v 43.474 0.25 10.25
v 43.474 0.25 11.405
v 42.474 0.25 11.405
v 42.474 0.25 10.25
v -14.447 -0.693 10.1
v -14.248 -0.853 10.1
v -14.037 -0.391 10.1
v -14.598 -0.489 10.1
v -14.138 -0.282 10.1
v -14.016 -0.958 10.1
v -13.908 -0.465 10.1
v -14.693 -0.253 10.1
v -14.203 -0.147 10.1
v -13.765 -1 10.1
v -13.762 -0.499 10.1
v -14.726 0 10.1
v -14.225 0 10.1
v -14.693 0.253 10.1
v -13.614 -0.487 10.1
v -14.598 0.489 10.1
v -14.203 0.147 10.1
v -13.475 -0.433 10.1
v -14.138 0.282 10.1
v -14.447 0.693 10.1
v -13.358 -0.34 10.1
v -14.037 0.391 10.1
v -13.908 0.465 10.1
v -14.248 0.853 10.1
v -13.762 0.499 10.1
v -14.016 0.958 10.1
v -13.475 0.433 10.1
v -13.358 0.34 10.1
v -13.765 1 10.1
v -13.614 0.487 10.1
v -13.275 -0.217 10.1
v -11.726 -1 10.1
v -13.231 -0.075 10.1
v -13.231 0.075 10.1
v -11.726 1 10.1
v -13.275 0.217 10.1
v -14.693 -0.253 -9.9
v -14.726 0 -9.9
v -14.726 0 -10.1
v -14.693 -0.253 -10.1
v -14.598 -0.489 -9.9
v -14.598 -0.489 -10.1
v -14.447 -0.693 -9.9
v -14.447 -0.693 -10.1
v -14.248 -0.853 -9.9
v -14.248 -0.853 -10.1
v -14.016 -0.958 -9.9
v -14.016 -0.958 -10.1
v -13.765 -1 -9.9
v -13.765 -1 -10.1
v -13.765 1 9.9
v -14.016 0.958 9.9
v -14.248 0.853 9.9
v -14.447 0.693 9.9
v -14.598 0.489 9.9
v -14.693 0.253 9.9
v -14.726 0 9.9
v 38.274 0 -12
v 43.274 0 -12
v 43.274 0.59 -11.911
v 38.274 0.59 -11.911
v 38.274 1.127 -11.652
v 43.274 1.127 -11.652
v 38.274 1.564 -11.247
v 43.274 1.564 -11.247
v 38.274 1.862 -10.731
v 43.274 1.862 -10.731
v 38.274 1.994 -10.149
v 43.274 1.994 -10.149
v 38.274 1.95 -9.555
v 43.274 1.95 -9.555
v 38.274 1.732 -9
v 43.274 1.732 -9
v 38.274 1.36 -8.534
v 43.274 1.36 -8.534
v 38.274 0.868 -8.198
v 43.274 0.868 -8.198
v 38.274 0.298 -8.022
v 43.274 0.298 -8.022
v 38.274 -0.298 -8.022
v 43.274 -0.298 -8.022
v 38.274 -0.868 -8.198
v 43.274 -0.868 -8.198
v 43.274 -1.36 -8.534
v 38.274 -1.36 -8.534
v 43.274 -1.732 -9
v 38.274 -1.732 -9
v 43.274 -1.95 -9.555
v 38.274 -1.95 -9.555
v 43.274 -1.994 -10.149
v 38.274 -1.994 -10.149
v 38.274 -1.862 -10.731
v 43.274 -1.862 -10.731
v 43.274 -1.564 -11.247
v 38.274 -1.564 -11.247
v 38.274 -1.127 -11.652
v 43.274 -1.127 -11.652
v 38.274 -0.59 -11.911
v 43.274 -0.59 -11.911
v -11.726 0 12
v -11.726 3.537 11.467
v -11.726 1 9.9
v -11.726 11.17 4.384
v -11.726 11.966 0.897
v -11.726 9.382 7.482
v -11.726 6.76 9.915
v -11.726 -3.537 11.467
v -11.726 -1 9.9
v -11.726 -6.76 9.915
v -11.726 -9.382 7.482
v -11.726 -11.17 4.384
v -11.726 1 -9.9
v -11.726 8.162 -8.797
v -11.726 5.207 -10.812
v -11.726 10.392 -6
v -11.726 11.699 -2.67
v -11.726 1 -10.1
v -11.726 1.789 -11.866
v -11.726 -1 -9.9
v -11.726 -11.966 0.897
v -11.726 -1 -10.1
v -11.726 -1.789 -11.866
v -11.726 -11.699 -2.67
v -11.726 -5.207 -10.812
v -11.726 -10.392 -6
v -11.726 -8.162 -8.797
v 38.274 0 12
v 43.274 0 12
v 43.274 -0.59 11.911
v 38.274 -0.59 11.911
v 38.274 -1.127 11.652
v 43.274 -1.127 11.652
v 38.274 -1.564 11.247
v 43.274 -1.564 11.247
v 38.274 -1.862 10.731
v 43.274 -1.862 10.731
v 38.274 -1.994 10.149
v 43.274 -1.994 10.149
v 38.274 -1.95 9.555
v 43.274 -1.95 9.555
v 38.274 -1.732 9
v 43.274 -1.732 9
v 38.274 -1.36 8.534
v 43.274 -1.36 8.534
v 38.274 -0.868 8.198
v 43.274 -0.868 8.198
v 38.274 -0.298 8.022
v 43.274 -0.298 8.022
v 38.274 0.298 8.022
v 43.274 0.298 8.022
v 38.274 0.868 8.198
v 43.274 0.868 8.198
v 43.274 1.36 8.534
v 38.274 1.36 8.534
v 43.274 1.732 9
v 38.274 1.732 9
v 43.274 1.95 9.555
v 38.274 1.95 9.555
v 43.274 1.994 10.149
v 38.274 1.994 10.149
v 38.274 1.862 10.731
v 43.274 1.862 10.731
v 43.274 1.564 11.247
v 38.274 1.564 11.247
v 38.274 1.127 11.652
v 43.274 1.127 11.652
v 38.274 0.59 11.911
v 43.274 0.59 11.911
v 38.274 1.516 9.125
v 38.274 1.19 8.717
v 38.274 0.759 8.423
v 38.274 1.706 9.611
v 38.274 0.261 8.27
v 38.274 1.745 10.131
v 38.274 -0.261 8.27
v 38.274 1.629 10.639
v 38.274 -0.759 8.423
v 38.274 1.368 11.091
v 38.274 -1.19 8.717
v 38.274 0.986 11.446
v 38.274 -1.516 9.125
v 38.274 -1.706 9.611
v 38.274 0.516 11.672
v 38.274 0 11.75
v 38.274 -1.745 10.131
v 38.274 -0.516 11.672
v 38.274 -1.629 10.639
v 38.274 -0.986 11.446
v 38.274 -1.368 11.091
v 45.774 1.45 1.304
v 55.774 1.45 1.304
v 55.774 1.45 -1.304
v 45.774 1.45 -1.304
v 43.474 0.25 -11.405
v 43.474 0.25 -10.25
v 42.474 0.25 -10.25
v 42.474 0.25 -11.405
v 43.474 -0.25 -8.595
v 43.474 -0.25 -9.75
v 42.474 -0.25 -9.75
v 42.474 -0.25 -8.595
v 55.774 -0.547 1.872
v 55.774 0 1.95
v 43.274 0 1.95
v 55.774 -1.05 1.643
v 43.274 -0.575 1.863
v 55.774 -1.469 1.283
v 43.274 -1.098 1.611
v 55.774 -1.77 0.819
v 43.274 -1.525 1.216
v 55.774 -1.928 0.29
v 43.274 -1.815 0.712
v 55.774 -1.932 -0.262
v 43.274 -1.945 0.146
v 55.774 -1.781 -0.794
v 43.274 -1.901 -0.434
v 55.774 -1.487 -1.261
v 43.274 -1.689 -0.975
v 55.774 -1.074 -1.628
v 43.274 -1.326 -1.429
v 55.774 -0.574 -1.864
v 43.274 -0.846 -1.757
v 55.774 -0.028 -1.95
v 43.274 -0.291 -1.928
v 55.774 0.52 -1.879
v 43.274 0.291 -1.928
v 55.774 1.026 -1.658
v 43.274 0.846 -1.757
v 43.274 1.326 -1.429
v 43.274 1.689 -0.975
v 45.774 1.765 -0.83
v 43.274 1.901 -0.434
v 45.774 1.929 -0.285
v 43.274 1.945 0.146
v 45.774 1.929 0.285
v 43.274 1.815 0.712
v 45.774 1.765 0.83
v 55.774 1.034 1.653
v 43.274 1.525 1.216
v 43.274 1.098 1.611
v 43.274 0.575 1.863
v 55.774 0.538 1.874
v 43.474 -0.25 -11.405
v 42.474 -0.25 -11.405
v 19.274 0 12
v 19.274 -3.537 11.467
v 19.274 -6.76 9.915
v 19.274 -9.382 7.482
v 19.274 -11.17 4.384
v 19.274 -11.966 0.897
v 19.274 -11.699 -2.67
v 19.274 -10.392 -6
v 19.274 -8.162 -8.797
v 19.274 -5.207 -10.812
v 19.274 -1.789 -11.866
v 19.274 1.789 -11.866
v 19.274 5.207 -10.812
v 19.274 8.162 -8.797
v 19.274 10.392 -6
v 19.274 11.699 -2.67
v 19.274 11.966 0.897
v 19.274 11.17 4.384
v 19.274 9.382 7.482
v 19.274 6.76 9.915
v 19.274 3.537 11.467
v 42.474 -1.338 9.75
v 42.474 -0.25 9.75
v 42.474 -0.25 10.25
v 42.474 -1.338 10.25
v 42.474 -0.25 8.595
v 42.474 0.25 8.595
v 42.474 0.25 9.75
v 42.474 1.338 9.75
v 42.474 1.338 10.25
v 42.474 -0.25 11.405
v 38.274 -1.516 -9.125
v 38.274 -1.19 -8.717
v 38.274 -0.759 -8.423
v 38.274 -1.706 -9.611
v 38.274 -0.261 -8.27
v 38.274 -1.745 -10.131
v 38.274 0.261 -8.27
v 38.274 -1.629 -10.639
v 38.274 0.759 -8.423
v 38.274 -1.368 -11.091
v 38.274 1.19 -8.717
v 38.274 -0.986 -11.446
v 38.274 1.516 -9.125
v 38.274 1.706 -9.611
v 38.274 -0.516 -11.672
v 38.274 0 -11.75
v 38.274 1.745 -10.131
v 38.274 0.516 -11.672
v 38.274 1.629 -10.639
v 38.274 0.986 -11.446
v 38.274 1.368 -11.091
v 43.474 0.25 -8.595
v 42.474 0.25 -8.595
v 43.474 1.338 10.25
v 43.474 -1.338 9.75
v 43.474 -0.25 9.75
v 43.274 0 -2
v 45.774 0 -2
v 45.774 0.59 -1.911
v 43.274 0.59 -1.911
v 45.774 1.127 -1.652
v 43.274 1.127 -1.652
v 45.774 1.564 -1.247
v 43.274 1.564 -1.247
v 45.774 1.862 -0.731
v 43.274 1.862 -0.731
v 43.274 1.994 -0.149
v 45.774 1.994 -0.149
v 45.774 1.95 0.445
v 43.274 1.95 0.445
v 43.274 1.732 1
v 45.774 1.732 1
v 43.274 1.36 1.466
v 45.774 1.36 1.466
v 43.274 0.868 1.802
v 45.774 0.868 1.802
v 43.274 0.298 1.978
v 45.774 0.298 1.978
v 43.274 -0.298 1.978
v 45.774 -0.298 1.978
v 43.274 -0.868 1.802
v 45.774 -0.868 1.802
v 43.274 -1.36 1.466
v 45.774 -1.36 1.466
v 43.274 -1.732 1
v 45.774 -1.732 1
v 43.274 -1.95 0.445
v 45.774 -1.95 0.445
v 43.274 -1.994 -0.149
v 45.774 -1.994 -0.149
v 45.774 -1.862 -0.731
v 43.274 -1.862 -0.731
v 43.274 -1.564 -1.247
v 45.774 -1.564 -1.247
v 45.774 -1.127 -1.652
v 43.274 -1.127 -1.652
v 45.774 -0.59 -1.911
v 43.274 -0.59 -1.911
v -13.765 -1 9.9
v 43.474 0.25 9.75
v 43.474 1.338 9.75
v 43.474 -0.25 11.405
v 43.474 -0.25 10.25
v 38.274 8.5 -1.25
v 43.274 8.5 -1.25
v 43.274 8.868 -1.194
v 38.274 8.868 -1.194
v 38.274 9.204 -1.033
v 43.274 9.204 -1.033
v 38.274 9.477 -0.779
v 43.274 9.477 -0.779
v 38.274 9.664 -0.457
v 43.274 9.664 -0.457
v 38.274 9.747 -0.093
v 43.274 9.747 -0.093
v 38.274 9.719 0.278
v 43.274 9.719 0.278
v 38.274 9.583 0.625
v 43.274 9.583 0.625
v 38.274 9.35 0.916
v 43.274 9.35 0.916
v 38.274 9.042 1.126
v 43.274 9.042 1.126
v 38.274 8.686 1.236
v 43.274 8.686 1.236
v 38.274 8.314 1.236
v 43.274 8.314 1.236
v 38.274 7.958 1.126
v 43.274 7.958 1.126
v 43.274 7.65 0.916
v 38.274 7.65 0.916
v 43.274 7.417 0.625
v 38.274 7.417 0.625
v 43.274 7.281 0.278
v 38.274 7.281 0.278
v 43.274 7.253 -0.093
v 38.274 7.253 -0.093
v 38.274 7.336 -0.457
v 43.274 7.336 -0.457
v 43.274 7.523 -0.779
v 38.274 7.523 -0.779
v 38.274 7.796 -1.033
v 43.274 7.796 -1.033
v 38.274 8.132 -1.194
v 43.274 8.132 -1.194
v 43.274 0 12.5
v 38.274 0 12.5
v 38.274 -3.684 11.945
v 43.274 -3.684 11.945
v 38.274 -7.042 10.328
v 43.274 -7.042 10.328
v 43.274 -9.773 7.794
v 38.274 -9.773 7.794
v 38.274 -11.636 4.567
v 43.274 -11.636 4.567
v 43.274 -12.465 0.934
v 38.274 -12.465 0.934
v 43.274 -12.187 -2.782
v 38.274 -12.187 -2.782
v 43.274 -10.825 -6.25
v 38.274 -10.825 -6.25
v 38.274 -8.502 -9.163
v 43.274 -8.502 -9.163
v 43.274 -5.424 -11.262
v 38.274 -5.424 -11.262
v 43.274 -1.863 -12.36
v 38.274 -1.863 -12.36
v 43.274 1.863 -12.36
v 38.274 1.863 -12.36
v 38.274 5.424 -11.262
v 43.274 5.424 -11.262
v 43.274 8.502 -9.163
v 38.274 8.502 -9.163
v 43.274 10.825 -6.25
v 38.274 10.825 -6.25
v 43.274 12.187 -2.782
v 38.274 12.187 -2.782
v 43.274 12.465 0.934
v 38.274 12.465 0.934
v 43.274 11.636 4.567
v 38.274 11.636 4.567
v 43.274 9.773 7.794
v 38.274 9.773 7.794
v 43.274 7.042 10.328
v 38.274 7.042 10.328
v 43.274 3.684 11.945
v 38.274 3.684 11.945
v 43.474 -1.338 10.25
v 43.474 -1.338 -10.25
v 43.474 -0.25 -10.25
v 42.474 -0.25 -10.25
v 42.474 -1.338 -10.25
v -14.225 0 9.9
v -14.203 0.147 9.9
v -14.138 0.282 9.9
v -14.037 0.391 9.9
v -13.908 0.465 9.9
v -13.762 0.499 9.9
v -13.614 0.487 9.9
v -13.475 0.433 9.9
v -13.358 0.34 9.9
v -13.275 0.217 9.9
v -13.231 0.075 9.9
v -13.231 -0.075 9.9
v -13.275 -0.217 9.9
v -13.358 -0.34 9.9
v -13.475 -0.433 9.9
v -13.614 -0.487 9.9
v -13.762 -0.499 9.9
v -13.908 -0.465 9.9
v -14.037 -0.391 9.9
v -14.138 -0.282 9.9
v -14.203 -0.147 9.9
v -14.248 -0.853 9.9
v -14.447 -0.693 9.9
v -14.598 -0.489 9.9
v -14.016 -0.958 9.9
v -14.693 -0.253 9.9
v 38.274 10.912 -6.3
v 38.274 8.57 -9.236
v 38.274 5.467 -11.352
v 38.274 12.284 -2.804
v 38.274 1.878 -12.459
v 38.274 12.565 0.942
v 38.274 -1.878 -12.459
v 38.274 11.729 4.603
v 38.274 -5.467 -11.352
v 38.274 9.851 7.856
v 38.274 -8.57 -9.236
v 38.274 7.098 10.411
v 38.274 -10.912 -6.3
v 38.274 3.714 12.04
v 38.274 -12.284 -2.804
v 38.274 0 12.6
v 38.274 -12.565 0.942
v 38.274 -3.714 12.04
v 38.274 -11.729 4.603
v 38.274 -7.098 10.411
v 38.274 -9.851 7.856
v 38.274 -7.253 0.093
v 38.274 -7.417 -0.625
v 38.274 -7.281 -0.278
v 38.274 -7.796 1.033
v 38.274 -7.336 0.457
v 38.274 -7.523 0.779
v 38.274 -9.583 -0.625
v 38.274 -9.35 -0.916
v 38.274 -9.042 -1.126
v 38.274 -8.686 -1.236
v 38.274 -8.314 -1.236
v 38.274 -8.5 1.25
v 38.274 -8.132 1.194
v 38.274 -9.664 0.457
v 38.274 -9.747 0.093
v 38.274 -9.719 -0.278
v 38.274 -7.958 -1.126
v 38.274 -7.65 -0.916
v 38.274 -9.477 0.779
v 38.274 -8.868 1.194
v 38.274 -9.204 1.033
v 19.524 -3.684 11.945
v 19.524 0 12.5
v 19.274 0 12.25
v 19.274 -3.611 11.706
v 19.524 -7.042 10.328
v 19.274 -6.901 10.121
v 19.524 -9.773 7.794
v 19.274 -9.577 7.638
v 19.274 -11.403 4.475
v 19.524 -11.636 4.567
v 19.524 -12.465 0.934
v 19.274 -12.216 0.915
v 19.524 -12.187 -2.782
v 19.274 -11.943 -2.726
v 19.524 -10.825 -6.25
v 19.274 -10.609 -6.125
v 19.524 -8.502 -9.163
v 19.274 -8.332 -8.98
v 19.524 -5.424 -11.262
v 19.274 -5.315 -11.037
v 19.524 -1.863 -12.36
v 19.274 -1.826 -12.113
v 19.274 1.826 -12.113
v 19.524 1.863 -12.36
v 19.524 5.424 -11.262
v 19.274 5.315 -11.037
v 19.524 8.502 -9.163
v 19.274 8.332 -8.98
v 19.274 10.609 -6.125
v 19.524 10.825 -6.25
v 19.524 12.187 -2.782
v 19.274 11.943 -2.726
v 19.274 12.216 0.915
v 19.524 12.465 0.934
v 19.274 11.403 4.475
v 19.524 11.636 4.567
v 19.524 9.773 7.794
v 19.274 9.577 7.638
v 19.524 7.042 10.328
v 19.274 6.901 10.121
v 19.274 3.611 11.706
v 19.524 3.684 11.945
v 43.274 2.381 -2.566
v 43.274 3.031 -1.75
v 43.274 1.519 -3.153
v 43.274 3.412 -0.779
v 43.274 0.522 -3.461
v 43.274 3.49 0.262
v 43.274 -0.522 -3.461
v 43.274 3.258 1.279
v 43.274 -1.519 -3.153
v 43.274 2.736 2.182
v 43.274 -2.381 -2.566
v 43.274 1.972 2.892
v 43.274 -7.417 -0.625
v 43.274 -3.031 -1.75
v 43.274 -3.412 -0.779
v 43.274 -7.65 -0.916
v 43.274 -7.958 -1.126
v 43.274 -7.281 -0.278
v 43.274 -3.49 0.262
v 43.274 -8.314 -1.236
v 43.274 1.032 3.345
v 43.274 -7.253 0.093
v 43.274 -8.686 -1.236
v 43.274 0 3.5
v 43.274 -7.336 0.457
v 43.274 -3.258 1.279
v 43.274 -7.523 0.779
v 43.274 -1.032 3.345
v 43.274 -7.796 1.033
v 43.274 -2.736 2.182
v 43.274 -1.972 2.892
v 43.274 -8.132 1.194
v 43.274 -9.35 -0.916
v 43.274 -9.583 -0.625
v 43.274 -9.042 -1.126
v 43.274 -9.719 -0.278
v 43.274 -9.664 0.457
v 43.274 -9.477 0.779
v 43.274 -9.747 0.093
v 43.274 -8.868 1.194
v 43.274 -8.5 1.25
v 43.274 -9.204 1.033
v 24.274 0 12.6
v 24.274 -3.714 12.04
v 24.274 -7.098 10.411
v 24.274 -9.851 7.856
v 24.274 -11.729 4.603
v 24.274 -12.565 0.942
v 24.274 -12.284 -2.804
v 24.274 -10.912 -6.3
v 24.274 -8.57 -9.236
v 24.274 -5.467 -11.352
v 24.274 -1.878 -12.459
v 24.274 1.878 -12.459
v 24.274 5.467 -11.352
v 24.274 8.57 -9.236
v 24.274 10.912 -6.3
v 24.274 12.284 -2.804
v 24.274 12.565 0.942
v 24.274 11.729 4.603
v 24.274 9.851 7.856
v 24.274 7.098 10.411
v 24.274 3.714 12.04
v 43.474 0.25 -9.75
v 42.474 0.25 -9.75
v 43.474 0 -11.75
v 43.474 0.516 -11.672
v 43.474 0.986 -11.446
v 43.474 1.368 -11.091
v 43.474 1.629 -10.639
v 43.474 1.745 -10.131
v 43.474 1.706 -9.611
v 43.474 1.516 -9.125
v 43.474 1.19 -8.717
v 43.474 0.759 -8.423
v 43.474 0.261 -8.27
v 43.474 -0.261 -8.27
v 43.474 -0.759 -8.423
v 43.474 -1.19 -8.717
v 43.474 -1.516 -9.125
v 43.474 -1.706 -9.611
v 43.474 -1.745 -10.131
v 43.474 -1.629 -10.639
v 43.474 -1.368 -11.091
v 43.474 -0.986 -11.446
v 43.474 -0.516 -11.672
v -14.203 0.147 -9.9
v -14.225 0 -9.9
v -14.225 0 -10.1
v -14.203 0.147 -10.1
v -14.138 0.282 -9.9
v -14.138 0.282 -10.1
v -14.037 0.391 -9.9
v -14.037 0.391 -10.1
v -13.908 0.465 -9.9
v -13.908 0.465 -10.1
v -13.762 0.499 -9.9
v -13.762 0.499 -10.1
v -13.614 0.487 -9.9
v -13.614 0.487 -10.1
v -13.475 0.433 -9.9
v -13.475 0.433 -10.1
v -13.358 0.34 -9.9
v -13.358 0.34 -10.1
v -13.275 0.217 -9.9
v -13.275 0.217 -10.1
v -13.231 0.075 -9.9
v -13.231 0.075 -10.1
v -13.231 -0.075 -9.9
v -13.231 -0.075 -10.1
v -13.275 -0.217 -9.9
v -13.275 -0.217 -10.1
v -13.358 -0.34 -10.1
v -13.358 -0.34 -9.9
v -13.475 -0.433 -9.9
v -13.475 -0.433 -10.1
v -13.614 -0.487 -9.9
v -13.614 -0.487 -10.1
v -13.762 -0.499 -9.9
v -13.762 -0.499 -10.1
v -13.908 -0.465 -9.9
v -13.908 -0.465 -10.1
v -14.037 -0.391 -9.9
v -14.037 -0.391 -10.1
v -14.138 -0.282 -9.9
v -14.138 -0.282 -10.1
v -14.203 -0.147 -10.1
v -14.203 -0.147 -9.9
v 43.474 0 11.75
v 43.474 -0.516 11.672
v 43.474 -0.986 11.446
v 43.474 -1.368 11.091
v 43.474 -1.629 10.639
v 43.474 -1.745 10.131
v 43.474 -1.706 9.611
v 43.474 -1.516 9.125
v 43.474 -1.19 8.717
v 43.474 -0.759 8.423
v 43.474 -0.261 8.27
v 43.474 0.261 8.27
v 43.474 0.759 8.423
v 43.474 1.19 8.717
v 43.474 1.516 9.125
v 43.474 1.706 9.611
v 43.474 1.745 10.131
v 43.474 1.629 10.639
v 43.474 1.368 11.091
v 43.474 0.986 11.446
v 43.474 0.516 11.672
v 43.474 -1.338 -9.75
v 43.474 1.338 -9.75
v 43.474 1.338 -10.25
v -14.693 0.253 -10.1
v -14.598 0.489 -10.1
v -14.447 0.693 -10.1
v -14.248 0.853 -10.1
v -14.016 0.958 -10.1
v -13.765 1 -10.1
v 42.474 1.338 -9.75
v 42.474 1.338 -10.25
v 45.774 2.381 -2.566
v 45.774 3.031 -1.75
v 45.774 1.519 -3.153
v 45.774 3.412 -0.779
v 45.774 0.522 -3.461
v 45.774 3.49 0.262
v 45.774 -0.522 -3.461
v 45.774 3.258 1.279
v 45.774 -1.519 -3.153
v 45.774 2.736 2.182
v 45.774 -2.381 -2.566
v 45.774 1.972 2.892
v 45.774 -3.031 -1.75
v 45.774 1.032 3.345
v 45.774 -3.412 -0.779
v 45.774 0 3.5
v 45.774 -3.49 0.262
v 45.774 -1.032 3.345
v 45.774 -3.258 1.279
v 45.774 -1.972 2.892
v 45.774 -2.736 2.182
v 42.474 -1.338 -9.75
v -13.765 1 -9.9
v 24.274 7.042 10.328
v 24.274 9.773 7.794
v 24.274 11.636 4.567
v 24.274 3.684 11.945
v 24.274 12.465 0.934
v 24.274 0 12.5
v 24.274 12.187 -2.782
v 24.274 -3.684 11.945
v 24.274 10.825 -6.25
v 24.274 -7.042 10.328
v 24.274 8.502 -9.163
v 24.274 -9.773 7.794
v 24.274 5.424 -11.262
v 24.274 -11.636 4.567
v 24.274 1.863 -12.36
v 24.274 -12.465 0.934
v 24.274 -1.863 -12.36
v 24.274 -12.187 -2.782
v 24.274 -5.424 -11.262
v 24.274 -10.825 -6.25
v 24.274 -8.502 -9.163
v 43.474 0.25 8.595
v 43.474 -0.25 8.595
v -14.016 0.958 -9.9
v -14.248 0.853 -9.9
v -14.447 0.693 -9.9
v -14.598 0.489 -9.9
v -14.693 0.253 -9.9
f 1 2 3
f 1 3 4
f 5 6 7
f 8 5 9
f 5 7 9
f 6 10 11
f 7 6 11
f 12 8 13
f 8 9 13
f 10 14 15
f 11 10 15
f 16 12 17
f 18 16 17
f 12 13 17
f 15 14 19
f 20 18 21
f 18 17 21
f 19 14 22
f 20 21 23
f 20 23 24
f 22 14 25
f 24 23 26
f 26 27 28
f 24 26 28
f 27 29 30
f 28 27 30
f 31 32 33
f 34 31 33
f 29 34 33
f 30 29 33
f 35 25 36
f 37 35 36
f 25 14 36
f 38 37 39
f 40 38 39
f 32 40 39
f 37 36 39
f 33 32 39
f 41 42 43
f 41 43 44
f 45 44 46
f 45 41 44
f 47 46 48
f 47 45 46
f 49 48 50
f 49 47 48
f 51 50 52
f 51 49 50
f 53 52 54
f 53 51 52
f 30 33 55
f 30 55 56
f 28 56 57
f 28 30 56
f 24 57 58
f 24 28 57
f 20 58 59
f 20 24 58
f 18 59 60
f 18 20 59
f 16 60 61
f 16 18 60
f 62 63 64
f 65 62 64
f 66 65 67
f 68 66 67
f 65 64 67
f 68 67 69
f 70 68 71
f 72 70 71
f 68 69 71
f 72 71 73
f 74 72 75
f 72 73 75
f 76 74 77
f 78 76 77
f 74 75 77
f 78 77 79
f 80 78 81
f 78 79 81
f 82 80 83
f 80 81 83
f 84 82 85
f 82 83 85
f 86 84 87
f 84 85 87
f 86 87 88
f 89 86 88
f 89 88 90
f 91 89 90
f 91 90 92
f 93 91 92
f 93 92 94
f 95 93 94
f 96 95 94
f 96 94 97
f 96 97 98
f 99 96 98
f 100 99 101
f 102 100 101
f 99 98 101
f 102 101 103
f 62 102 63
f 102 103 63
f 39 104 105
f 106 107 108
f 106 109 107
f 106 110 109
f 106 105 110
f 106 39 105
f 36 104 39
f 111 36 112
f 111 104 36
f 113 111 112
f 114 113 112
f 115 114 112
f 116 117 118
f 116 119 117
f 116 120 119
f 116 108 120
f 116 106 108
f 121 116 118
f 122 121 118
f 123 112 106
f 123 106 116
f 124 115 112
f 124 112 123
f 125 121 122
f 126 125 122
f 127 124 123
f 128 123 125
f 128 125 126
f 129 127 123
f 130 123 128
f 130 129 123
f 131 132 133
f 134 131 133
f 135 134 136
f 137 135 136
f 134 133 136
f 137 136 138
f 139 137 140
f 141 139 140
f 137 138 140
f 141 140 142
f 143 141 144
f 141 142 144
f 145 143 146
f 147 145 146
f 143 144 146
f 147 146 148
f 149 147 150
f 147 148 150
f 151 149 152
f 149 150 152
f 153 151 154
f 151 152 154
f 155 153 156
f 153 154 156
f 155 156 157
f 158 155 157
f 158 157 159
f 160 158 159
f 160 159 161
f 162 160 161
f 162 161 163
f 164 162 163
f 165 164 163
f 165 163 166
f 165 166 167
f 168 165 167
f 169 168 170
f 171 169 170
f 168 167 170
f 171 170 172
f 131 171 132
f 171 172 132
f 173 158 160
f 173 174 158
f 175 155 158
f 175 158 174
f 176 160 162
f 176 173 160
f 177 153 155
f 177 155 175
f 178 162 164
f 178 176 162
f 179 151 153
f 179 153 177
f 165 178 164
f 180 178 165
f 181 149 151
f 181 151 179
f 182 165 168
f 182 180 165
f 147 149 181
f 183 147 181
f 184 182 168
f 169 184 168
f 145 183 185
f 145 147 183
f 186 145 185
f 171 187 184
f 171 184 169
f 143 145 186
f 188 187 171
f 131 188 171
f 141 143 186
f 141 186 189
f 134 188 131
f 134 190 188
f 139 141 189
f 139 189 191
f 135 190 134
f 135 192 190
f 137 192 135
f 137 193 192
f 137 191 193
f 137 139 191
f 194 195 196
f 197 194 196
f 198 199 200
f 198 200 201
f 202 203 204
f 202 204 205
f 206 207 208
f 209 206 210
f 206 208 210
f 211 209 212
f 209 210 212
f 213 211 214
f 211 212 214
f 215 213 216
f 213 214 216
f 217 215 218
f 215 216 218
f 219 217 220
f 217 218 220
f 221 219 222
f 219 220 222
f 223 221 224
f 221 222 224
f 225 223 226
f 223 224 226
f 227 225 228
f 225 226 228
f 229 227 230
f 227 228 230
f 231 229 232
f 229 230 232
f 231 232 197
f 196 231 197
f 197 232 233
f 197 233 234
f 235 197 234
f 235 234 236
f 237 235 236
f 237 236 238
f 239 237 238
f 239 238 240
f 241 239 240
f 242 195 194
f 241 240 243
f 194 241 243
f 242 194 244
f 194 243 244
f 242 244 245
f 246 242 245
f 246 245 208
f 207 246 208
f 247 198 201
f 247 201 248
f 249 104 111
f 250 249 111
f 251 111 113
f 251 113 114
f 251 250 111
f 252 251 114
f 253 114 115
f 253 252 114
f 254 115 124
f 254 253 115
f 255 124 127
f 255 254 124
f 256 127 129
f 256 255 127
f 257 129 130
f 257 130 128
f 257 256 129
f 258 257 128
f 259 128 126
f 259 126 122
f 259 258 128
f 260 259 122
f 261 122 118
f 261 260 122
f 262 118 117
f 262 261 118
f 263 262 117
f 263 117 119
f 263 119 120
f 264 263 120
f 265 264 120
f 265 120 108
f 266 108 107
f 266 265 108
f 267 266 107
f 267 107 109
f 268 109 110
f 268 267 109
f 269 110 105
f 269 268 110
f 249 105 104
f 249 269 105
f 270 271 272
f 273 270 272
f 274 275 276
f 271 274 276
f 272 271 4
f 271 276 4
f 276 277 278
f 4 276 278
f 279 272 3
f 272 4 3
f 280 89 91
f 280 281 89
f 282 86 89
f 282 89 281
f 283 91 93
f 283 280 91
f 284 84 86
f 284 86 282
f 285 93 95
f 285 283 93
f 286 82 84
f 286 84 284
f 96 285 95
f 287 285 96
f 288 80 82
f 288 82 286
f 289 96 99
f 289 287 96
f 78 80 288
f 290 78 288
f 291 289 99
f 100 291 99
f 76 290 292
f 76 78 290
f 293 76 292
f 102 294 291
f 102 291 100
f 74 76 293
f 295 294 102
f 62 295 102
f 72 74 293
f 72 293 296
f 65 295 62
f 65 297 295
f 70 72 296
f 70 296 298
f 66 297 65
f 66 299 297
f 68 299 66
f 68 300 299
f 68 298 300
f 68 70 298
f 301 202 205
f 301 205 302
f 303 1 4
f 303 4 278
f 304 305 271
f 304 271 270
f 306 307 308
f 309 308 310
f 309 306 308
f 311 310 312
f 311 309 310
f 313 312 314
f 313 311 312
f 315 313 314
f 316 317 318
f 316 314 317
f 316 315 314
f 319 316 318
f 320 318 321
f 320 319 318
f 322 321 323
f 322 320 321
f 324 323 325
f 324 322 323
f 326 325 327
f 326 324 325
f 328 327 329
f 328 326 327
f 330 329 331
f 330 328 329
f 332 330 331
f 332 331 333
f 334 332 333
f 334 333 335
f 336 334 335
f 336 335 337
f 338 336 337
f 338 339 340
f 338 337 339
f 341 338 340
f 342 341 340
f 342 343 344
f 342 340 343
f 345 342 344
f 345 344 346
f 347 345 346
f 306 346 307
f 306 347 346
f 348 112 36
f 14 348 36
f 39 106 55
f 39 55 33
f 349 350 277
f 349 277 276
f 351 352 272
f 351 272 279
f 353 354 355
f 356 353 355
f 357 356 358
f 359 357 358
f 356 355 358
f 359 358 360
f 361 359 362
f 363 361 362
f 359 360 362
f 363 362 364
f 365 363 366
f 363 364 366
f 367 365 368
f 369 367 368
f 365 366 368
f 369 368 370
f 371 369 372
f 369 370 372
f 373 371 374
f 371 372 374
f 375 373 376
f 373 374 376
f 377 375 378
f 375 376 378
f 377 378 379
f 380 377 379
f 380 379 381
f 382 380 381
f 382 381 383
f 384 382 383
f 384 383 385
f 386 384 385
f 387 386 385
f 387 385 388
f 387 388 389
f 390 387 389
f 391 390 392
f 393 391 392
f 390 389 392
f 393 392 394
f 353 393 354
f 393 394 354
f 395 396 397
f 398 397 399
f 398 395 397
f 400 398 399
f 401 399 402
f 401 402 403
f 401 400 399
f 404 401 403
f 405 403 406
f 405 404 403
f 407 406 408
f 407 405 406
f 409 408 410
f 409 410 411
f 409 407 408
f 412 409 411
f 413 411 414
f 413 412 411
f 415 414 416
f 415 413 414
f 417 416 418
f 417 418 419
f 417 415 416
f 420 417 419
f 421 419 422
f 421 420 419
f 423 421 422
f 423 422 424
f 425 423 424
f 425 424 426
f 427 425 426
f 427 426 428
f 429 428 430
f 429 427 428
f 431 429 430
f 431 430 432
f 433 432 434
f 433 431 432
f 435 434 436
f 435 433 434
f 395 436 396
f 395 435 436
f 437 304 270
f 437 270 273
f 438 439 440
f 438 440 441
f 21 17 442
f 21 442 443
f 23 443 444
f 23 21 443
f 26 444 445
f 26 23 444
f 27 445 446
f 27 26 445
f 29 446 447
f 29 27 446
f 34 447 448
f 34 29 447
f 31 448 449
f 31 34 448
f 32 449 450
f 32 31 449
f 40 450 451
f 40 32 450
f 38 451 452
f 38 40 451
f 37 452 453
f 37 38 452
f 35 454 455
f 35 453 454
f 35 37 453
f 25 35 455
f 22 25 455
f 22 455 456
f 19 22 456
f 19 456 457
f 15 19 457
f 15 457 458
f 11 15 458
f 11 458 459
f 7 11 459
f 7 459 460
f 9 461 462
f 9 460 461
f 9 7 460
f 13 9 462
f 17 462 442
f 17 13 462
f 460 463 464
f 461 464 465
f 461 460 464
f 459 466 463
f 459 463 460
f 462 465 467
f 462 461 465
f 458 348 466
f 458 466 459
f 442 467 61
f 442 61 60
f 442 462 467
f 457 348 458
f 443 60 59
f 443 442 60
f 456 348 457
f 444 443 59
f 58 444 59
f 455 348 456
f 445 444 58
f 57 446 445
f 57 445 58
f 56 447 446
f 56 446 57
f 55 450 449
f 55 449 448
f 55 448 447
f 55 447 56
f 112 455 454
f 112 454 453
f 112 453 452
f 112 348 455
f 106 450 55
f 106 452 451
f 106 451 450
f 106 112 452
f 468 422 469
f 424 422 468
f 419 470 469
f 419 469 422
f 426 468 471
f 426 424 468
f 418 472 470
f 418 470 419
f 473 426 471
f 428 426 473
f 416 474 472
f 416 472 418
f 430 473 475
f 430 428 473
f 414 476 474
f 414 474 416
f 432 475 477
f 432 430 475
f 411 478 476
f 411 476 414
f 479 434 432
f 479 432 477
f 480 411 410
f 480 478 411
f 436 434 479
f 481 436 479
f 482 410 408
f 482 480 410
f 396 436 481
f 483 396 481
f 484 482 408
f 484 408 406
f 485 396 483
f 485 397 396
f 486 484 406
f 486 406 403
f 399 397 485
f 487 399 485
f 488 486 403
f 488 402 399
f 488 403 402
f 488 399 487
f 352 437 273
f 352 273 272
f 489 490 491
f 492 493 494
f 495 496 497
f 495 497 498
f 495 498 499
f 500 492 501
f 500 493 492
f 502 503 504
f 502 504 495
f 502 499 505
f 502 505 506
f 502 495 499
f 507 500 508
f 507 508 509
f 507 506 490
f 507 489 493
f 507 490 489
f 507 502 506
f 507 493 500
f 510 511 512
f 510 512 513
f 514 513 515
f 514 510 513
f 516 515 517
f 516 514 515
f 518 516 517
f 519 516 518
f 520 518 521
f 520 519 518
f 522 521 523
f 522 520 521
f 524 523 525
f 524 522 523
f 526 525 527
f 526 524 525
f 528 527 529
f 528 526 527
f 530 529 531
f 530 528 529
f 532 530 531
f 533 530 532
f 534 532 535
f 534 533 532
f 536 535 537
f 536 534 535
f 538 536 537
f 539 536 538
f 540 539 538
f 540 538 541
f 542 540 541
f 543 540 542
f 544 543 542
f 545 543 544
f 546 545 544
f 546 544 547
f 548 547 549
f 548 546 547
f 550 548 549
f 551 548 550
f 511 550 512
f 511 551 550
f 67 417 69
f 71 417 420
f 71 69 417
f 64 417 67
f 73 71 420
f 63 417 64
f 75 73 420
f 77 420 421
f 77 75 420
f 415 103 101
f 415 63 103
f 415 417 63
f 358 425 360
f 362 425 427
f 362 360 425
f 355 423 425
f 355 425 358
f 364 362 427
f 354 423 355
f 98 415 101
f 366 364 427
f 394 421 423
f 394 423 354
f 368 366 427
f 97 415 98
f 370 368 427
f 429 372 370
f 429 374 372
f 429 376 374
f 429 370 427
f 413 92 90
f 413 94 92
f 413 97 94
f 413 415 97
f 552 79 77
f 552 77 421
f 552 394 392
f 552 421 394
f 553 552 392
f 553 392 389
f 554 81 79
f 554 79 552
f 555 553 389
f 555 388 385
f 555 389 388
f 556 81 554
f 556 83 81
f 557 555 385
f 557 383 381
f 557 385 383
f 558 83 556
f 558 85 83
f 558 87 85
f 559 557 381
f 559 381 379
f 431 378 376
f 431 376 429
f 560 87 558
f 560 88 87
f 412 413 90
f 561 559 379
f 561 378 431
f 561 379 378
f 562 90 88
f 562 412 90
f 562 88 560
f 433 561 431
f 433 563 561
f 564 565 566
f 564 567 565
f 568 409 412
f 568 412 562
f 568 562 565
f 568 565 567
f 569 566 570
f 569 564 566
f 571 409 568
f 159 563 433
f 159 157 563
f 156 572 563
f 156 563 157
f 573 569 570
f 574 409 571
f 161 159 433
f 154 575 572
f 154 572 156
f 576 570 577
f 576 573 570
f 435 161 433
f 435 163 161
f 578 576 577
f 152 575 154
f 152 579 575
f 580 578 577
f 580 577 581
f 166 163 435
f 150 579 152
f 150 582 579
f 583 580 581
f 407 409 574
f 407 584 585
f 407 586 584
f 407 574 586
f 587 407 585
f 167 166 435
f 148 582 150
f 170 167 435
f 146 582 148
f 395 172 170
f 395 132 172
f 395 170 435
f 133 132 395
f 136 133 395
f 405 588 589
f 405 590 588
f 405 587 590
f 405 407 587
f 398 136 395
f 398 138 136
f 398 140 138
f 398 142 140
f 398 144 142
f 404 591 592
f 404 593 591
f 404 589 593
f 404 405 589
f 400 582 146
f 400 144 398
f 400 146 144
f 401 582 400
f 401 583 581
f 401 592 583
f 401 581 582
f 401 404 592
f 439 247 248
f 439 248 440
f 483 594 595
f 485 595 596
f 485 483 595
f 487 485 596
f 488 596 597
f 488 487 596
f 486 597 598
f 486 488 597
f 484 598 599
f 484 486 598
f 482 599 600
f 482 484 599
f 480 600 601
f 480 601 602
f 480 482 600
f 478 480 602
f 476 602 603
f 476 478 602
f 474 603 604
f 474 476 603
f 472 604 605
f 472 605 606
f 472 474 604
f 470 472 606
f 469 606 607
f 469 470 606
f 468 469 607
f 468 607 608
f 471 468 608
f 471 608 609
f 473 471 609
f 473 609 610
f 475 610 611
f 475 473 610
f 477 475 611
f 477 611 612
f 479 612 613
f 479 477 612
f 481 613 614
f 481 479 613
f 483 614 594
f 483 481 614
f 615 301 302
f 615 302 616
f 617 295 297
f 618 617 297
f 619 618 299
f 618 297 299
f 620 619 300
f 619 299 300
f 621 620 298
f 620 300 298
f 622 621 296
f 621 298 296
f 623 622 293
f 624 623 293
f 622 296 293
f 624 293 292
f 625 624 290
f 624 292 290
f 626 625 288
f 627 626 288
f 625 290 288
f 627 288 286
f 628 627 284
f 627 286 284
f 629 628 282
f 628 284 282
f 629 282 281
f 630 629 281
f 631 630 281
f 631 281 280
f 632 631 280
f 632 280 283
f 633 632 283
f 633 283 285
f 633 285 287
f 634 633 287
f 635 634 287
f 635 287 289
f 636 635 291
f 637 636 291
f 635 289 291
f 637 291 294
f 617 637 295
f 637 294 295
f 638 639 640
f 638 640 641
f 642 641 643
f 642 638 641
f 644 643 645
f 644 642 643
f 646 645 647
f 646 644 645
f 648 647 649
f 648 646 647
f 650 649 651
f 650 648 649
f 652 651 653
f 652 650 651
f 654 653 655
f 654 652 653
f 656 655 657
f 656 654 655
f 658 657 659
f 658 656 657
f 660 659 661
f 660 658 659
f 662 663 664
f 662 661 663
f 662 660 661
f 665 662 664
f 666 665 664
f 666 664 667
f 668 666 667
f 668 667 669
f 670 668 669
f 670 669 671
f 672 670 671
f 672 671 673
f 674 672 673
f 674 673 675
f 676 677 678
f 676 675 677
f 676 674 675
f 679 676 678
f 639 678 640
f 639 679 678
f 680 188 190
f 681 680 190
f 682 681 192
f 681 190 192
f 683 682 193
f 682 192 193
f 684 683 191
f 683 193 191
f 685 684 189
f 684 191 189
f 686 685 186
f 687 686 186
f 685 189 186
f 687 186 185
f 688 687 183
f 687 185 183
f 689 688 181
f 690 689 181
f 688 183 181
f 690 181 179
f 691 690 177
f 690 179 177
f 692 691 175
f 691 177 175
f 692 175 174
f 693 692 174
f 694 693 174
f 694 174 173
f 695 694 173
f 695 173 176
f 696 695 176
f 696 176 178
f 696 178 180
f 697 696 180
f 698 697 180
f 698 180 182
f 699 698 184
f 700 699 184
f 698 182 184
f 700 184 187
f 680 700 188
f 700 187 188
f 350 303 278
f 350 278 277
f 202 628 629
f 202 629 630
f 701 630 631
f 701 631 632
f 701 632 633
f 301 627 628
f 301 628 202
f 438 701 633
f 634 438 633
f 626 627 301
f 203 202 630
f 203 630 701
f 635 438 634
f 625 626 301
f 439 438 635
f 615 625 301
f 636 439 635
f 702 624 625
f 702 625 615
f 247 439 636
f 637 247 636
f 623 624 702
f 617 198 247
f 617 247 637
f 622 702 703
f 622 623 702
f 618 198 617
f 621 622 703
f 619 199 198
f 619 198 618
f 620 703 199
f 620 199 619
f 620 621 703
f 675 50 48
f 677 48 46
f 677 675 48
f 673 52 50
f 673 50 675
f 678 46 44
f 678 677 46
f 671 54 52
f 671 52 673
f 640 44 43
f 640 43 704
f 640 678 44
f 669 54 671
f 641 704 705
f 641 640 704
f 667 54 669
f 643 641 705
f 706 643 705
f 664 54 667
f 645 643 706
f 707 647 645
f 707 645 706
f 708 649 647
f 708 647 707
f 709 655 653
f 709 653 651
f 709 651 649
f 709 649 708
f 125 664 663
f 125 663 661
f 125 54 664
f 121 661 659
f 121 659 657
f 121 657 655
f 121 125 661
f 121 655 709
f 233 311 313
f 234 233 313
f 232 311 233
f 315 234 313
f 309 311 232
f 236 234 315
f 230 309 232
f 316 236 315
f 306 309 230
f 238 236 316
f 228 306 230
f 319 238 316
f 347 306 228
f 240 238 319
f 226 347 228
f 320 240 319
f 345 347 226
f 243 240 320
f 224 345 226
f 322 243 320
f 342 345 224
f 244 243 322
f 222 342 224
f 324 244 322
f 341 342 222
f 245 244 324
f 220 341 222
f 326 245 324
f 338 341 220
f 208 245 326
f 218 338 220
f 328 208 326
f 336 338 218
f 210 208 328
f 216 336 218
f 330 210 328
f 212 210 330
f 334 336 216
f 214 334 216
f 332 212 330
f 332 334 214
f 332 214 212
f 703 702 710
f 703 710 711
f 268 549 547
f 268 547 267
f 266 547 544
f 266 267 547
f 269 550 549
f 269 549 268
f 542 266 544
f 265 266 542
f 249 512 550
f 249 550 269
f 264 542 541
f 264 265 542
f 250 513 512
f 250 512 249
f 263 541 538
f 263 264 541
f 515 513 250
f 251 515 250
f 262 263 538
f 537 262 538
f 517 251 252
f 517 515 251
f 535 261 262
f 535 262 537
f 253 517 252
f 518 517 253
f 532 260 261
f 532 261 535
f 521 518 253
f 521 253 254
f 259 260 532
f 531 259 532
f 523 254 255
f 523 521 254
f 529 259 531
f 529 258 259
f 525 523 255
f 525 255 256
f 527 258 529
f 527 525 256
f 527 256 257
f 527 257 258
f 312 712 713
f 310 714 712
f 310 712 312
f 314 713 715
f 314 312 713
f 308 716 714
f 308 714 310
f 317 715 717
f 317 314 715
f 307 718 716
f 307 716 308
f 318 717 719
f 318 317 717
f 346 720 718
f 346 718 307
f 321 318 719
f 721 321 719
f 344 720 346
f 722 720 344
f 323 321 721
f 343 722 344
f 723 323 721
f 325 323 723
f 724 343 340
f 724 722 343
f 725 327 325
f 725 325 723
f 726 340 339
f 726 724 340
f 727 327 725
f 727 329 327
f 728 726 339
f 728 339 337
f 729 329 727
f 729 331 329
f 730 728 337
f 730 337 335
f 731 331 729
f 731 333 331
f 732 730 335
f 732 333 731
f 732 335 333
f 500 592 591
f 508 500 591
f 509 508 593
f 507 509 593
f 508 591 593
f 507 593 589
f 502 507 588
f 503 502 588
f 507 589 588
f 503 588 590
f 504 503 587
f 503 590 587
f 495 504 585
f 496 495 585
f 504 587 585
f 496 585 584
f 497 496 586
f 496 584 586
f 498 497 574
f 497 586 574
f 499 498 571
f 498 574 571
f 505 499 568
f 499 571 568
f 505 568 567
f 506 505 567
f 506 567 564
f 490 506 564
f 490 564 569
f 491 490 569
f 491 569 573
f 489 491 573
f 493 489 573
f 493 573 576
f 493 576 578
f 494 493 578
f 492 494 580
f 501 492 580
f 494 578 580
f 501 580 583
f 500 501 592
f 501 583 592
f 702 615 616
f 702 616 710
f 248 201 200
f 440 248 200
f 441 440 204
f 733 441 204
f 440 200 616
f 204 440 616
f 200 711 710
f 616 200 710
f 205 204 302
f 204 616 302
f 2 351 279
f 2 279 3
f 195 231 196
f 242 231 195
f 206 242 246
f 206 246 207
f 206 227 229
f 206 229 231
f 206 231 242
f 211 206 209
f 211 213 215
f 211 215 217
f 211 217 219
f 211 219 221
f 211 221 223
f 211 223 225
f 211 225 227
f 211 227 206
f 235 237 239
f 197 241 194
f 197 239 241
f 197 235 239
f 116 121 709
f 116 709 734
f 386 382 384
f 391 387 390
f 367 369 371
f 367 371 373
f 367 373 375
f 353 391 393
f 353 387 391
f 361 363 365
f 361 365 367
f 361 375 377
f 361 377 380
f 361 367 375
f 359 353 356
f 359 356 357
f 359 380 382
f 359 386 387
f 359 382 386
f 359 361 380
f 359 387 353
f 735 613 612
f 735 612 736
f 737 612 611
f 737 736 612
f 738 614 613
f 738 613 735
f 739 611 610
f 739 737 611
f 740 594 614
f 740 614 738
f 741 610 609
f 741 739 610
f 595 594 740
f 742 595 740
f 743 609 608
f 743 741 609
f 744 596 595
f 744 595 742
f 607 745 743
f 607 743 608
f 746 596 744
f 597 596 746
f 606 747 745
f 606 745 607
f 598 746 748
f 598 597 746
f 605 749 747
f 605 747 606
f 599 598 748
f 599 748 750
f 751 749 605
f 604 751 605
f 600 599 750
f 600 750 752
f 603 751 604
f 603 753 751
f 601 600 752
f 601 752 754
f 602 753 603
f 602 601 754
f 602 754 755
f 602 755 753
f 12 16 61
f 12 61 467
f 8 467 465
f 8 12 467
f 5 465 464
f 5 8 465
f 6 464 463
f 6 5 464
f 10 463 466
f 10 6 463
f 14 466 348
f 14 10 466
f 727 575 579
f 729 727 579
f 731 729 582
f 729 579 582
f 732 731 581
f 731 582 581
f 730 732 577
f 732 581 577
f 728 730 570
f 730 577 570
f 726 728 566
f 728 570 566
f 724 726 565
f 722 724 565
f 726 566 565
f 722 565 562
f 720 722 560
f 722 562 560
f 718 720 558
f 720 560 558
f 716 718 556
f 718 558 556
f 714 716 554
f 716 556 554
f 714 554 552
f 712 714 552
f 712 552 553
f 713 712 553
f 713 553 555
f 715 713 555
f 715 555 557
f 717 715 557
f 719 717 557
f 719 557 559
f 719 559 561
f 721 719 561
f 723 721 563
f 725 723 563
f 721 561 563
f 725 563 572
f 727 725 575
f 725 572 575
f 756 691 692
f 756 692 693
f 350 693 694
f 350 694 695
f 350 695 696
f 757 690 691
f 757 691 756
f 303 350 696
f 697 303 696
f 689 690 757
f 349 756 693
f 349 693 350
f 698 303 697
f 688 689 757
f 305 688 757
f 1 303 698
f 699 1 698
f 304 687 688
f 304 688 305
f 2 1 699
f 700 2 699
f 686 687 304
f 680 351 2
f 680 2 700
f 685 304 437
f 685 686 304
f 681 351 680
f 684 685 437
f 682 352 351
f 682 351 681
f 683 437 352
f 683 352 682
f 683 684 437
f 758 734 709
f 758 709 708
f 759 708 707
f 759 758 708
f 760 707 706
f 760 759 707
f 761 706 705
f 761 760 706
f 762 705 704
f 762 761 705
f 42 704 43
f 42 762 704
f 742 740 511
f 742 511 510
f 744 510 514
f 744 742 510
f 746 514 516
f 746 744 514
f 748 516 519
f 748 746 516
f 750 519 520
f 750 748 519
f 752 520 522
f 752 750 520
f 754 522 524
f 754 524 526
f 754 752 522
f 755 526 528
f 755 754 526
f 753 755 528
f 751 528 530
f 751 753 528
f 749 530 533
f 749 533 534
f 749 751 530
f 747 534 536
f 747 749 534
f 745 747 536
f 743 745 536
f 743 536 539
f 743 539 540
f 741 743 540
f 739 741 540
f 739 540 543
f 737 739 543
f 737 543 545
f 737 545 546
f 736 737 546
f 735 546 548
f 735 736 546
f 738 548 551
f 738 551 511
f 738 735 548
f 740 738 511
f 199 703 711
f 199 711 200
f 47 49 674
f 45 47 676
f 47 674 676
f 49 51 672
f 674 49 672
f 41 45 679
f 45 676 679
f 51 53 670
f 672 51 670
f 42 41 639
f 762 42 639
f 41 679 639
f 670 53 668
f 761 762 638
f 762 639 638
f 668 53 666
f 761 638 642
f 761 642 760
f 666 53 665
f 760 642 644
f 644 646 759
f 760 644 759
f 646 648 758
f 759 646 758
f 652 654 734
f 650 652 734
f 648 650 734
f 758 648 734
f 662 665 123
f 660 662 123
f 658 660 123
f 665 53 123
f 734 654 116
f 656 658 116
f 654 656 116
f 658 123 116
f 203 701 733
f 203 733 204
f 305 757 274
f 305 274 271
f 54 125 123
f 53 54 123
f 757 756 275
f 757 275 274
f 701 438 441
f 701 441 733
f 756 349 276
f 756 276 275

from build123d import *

# Parameters (mm, degrees)
SKETCH3_R               = 3.5
SKETCH3_R_2             = 2
BOSS_EXTRUDE1_DEPTH     = 2.5
SKETCH4_R               = 1.95
BOSS_EXTRUDE2_DEPTH     = 12.5
CUT_EXTRUDE1_DEPTH      = 10
CHAMFER1_SIZE           = 0.25
SKETCH6_R               = 2
CUT_EXTRUDE2_DEPTH      = 5
SKETCH7_R               = 1.75
BOSS_EXTRUDE3_DEPTH     = 5.2
CUT_EXTRUDE4_DEPTH      = 1
SKETCH9_R               = 1.25
CUT_EXTRUDE5_DEPTH      = 5
SKETCH11_W              = 0.2
SKETCH11_H              = 2
BOSS_EXTRUDE4_DEPTH     = 3
CUT_EXTRUDE6_START      = -20.2
CUT_EXTRUDE6_DEPTH      = 20.2
CUT_EXTRUDE7_DEPTH      = 62.520823074
CUT_EXTRUDE7_DEPTH_BACK = 62.520823074
SKETCH13_R              = 0.5


# Read off the part's stored shape, not the designer's step: Cut-Extrude6
with BuildPart() as part:
    # Sketch1 → Revolve1 (revolve)
    with BuildSketch(Plane.XY, mode=Mode.PRIVATE) as revolve1_sk:
        Polygon((-11.725797436, 0), (-11.725797436, 12), (19.274202564, 12), (19.274202564, 12.5), (24.274202564, 12.5), (24.274202564, 12.6), (38.274202564, 12.6), (38.274202564, 12.5), (43.274202564, 12.5), (43.274202564, 0), align=None)
    revolve(revolve1_sk.sketch.rotate(Axis((-11.725797436, 0, 0), (1, 0, 0)), 90), axis=Axis((-11.725797436, 0, 0), (1, 0, 0)))

    # Sketch3 → Boss-Extrude1 (add)
    with BuildSketch(Plane(origin=(43.274202564, 0, 0), x_dir=(0, 0, -1), z_dir=(1, 0, 0))):
        with Locations(Location((0, 0, 0), (0, 0, 180))):
            Circle(SKETCH3_R)
        Circle(SKETCH3_R_2, mode=Mode.SUBTRACT)
    extrude(amount=BOSS_EXTRUDE1_DEPTH)

    # Sketch4 → Boss-Extrude2 (add)
    with BuildSketch(Plane(origin=(43.274202564, 0, 0), x_dir=(0, 0, -1), z_dir=(1, 0, 0))):
        with Locations(Location((0, 0, 0), (0, 0, 180))):
            Circle(SKETCH4_R)
    extrude(amount=BOSS_EXTRUDE2_DEPTH)

    # Sketch5 → Cut-Extrude1 (cut)
    with BuildSketch(Plane(origin=(55.774202564, 0, 0), x_dir=(0, 0, -1), z_dir=(1, 0, 0))):
        with BuildLine():
            Line((0, 1.45), (1.563854219, 1.45))
            ThreePointArc((1.563854219, 1.45), (0.020575485, 2.299790468), (-1.52270325, 1.45))
            Line((-1.52270325, 1.45), (0, 1.45))
        make_face()
    extrude(amount=-CUT_EXTRUDE1_DEPTH, mode=Mode.SUBTRACT)

    # Chamfer1
    chamfer1_edges = [part.edges().sort_by_distance(p)[0] for p in [
        (19.274202564, 0, -12.5),
    ]]
    chamfer(chamfer1_edges, length=CHAMFER1_SIZE)

    # Sketch6 → Cut-Extrude2 (cut)
    with BuildSketch(Plane(origin=(43.274202564, 0, 0), x_dir=(0, 0, -1), z_dir=(1, 0, 0))):
        with Locations((10, 0)):
            Circle(SKETCH6_R)
        with Locations(Location((-10, 0, 0), (0, 0, 180))):
            Circle(SKETCH6_R)
    extrude(amount=-CUT_EXTRUDE2_DEPTH, mode=Mode.SUBTRACT)

    # Sketch7 → Boss-Extrude3 (add)
    with BuildSketch(Plane(origin=(38.274202564, 0, 0), x_dir=(0, 0, -1), z_dir=(1, 0, 0))):
        with Locations((10, 0)):
            Circle(SKETCH7_R)
        with Locations(Location((-10, 0, 0), (0, 0, 180))):
            Circle(SKETCH7_R)
    extrude(amount=BOSS_EXTRUDE3_DEPTH)

    # Sketch8 → Cut-Extrude4 (cut)
    with BuildSketch(Plane(origin=(43.474202564, 0, 0), x_dir=(0, 0, -1), z_dir=(1, 0, 0))):
        Polygon((8.594754122, -0.25), (8.594754122, 0.25), (9.75, 0.25), (9.75, 1.338286548), (10.25, 1.338286548), (10.25, 0.25), (11.405245878, 0.25), (11.405245878, -0.25), (10.25, -0.25), (10.25, -1.338286548), (9.75, -1.338286548), (9.75, -0.25), align=None)
        Polygon((-10.25, -0.25), (-11.405245878, -0.25), (-11.405245878, 0.25), (-10.25, 0.25), (-10.25, 1.338286548), (-9.75, 1.338286548), (-9.75, 0.25), (-8.594754122, 0.25), (-8.594754122, -0.25), (-9.75, -0.25), (-9.75, -1.338286548), (-10.25, -1.338286548), align=None)
    extrude(amount=-CUT_EXTRUDE4_DEPTH, mode=Mode.SUBTRACT)

    # Sketch9 → Cut-Extrude5 (cut)
    with BuildSketch(Plane(origin=(43.274202564, 0, 0), x_dir=(0, 0, -1), z_dir=(1, 0, 0))):
        with Locations((0, 8.5)):
            Circle(SKETCH9_R)
        with Locations(Location((0, -8.5, 0), (0, 0, 180))):
            Circle(SKETCH9_R)
    extrude(amount=-CUT_EXTRUDE5_DEPTH, mode=Mode.SUBTRACT)

    # Sketch11 → Boss-Extrude4 (add)
    with BuildSketch(Plane.ZY.offset(11.725797436)):
        with Locations((10, 0)):
            Rectangle(SKETCH11_W, SKETCH11_H)
        with Locations((-10, 0)):
            Rectangle(SKETCH11_W, SKETCH11_H)
    extrude(amount=BOSS_EXTRUDE4_DEPTH)

    # Cut-Extrude6 outline → Cut-Extrude6 (cut)
    with BuildSketch(Plane(origin=(0, 0, -10.1), x_dir=(-1, 0, 0), z_dir=(0, 0, -1)).offset(CUT_EXTRUDE6_START)):
        with BuildLine():
            ThreePointArc((13.765046185, 1), (14.446690478, 0.693369124), (14.725797436, 0))
            Line((14.725797436, 0), (14.725797436, 1))
            Line((14.725797436, 1), (13.765046185, 1))
        make_face()
        with BuildLine():
            ThreePointArc((14.725797436, 0), (14.446690478, -0.693369124), (13.765046185, -1))
            Line((13.765046185, -1), (14.725797436, -1))
            Line((14.725797436, -1), (14.725797436, 0))
        make_face()
    extrude(amount=CUT_EXTRUDE6_DEPTH, mode=Mode.SUBTRACT)

    # Sketch13 → Cut-Extrude7 (cut, two sides: drawn at the far end of the back side and taken through both)
    with BuildSketch(Plane(origin=(0, 0, -10.1), x_dir=(-1, 0, 0), z_dir=(0, 0, -1)).offset(-CUT_EXTRUDE7_DEPTH_BACK)):
        with Locations((13.724995738, 0)):
            Circle(SKETCH13_R)
    extrude(amount=CUT_EXTRUDE7_DEPTH + CUT_EXTRUDE7_DEPTH_BACK, mode=Mode.SUBTRACT)


solid = part.part
